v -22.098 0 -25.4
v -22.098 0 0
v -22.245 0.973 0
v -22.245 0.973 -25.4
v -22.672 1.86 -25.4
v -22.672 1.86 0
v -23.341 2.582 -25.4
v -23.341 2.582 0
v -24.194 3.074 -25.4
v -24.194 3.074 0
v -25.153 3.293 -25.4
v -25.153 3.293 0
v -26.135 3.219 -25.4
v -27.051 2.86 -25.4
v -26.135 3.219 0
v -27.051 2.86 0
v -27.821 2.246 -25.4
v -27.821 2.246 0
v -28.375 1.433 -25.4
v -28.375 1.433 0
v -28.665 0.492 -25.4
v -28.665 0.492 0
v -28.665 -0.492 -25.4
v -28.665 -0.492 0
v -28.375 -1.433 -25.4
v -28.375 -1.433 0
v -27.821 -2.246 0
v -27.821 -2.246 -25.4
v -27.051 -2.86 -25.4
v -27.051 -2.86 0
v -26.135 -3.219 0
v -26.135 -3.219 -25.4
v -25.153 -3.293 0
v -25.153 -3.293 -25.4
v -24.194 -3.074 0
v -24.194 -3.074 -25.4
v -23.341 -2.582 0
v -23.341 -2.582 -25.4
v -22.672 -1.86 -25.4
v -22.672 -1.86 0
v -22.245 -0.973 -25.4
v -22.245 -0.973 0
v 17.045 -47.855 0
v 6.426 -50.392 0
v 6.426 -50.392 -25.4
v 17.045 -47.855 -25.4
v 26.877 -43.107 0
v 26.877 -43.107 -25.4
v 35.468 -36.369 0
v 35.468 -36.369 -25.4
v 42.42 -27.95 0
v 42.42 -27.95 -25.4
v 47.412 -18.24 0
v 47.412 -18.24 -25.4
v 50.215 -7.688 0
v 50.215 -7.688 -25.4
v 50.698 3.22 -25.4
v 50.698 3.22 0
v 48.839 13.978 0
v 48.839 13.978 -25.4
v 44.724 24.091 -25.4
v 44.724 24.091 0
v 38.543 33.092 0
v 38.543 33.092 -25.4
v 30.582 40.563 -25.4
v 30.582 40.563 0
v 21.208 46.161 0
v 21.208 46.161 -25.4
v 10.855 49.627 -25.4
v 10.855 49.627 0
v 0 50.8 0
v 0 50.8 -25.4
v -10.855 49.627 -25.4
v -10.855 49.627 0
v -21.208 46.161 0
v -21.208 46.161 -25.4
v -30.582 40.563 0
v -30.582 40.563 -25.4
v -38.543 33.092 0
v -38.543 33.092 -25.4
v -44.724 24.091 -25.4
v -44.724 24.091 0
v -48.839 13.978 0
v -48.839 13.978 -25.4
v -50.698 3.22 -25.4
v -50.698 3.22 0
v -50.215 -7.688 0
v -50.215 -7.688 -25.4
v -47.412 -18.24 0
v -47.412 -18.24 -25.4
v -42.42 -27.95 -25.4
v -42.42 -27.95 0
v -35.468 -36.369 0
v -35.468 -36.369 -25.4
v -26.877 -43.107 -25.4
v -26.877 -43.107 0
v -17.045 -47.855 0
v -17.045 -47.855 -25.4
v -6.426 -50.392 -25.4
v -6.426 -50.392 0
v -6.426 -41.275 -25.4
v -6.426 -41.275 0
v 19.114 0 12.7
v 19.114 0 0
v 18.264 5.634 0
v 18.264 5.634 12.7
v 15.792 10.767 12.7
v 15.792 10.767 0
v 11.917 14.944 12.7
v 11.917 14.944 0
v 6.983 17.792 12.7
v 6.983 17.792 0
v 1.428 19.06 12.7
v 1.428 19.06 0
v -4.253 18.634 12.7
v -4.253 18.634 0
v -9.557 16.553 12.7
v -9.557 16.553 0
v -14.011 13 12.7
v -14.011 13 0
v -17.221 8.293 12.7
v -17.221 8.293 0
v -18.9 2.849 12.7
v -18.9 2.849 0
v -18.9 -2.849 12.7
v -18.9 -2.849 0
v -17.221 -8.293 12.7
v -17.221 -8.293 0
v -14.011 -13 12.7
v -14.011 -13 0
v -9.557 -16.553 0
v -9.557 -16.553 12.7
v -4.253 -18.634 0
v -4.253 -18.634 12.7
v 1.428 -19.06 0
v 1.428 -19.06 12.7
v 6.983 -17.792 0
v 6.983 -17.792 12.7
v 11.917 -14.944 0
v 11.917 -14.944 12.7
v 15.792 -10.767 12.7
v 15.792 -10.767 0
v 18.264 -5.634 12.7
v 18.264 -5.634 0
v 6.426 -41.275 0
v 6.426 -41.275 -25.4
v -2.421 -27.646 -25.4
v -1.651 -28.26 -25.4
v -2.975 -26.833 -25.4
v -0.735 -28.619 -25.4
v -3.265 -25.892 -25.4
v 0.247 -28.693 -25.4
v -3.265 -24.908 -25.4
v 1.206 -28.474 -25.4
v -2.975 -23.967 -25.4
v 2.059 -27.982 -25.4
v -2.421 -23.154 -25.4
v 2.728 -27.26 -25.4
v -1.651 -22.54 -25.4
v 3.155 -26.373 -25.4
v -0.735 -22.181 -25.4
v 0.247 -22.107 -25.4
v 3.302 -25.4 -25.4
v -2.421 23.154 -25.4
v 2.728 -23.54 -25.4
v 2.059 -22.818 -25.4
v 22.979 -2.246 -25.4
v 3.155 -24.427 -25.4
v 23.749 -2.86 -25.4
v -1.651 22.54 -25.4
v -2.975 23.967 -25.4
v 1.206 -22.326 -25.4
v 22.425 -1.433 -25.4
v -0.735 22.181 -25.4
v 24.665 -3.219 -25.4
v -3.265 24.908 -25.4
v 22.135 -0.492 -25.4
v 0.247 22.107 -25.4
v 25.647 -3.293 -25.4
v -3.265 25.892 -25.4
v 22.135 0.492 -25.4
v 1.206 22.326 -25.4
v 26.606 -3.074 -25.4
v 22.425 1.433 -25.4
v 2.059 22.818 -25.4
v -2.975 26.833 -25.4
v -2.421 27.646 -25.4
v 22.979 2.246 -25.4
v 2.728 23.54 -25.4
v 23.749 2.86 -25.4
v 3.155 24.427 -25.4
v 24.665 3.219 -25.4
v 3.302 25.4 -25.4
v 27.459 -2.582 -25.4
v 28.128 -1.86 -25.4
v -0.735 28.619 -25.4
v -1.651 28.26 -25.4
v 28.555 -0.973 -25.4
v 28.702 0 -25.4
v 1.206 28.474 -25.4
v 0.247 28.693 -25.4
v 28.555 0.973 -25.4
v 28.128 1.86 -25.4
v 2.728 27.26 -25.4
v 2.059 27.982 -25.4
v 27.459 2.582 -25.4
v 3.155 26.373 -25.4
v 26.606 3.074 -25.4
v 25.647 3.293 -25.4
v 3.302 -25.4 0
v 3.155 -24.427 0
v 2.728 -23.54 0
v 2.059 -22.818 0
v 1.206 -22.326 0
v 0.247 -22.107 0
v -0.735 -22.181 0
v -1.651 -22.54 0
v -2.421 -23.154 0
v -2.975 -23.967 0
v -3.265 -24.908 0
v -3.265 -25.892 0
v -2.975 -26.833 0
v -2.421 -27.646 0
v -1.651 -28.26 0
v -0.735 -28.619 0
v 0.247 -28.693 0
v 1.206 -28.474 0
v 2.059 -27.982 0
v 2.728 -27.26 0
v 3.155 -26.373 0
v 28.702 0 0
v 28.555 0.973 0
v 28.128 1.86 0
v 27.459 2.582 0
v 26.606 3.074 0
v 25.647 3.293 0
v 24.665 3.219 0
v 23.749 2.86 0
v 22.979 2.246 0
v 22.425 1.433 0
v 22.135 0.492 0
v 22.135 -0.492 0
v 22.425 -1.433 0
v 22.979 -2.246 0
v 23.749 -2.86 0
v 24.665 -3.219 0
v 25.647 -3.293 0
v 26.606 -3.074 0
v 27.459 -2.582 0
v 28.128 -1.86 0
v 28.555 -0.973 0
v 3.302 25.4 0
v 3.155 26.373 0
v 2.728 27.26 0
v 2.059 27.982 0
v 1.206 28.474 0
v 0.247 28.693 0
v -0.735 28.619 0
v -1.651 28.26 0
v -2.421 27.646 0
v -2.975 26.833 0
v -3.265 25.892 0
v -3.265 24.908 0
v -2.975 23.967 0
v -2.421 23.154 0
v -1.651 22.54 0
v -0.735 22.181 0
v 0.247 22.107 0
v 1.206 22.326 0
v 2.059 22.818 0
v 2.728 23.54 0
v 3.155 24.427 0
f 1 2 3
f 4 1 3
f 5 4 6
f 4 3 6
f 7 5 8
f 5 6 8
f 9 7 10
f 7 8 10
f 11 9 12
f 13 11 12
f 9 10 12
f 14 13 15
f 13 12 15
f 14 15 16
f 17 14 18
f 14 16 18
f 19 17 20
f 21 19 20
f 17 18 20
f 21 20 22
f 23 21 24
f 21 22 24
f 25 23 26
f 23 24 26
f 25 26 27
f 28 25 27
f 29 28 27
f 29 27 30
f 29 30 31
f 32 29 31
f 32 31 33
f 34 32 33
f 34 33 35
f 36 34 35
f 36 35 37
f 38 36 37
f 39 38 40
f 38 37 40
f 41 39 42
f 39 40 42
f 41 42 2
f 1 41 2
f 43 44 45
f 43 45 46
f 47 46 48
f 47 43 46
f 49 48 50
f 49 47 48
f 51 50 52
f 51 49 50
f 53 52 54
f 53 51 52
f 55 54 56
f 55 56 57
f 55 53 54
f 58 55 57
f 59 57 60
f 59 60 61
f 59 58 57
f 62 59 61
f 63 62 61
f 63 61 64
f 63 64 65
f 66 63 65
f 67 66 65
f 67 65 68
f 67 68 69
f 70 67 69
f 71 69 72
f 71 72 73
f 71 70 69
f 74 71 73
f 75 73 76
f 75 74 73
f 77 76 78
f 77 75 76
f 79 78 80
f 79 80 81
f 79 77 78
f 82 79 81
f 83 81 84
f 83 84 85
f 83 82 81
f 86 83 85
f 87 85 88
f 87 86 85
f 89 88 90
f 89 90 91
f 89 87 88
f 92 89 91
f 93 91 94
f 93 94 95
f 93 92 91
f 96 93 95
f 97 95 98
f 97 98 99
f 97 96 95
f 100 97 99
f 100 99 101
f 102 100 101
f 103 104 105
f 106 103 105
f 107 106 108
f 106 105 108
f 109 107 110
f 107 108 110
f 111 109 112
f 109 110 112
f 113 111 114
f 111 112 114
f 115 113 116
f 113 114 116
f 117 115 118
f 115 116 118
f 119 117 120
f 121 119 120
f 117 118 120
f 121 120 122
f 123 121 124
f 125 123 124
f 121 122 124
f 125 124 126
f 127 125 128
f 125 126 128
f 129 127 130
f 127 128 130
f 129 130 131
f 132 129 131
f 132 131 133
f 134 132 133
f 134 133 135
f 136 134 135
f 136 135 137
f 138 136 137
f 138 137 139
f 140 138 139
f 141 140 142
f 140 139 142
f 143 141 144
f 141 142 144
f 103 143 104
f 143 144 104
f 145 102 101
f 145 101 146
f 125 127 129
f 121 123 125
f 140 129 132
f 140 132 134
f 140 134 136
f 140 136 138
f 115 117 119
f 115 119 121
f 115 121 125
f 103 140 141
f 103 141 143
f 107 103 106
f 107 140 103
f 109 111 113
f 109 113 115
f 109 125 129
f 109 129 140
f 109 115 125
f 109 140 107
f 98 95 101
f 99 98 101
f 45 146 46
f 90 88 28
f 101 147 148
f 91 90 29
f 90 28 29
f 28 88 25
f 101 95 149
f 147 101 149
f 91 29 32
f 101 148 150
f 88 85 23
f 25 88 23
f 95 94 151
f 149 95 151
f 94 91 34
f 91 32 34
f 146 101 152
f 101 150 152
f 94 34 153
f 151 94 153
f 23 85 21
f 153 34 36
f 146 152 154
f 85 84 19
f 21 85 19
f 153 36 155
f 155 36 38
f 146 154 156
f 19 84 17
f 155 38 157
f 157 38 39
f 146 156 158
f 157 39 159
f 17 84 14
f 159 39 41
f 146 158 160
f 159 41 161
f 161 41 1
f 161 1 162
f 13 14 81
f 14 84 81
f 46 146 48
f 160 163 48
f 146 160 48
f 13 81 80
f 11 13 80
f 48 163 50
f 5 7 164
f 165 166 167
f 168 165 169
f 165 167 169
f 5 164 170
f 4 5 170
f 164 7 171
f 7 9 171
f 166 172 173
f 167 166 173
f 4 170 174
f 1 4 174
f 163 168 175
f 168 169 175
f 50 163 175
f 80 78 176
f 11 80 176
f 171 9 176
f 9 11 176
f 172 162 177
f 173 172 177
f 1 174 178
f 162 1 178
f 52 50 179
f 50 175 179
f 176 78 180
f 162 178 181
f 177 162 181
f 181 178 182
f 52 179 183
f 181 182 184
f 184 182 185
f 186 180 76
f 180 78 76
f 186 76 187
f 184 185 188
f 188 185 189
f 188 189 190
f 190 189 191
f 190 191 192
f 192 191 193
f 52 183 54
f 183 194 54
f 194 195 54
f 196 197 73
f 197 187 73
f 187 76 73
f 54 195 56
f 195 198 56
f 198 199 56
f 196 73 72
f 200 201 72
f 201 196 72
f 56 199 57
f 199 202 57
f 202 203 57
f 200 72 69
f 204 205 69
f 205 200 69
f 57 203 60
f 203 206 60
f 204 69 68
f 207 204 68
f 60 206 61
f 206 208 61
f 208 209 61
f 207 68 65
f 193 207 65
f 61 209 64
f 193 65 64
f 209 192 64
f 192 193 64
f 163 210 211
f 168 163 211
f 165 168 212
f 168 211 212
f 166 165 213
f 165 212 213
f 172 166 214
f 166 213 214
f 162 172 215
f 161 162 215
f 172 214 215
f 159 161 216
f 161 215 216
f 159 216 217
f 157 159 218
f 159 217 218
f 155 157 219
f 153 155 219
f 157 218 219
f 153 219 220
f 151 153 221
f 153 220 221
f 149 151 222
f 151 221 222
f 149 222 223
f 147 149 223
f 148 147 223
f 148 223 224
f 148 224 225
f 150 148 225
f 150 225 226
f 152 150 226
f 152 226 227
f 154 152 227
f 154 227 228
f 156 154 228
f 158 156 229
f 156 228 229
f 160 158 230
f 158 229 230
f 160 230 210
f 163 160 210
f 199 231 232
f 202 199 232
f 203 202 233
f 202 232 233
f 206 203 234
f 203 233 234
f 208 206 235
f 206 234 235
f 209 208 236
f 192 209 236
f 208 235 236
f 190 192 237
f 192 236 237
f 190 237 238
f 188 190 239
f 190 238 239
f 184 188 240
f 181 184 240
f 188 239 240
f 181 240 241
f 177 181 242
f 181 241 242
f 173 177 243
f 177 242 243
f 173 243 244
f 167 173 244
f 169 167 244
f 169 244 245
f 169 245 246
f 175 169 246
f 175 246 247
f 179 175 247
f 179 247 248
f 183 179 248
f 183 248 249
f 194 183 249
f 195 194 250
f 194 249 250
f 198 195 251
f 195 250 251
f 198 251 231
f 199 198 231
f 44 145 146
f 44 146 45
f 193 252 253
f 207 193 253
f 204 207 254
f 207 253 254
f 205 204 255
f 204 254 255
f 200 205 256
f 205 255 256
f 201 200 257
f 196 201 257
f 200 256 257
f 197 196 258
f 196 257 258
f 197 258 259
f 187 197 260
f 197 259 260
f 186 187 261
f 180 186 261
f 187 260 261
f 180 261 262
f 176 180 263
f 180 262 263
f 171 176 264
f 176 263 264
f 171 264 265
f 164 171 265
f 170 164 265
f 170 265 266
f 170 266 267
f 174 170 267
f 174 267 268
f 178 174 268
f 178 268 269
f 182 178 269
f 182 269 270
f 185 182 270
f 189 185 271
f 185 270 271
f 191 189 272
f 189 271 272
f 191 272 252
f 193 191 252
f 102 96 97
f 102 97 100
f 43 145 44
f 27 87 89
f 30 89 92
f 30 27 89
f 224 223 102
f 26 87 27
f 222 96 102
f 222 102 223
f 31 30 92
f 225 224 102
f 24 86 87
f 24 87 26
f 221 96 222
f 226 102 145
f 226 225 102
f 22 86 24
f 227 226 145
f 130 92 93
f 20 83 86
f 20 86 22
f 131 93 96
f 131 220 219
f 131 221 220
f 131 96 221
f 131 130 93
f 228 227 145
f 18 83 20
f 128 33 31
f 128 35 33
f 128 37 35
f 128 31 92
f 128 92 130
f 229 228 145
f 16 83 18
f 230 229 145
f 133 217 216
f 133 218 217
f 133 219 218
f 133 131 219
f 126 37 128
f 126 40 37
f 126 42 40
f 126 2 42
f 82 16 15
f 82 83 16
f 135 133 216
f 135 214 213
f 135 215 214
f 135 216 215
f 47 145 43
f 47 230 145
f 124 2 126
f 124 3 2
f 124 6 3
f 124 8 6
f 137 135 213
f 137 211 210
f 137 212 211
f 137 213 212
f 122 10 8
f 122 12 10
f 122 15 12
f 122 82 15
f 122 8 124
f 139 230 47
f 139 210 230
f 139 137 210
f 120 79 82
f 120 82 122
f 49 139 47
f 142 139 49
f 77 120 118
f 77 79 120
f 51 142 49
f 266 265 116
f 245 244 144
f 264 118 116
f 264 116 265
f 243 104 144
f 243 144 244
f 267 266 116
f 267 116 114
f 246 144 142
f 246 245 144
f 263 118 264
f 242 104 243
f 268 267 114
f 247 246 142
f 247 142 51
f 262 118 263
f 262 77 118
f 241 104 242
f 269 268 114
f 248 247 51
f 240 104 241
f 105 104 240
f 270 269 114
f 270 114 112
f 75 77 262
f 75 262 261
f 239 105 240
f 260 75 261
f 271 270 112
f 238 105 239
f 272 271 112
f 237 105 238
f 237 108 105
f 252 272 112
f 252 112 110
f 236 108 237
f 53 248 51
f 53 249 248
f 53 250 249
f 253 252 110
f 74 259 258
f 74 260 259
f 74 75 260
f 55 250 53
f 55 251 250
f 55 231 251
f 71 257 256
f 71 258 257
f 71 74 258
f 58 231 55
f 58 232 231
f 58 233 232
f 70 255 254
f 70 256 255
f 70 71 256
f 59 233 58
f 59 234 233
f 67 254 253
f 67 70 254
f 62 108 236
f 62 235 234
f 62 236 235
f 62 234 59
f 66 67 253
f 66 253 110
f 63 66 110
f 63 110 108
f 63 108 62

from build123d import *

# Parameters (mm, degrees)
SKETCH1_R           = 3.302
BOSS_EXTRUDE1_DEPTH = 25.4
SKETCH1_4_R         = 19.1135
BOSS_EXTRUDE2_DEPTH = 12.7


with BuildPart() as part:
    # Sketch1 → Boss-Extrude1 (new body)
    with BuildSketch(Plane.XY):
        with BuildLine():
            Line((-6.4262, -50.391903651), (-6.4262, -41.275))
            Line((-6.4262, -41.275), (6.4262, -41.275))
            Line((6.4262, -41.275), (6.4262, -50.391903651))
            ThreePointArc((6.4262, -50.391903651), (0, 50.8), (-6.4262, -50.391903651))
        make_face()
        with Locations((-25.4, 0)):
            Circle(SKETCH1_R, mode=Mode.SUBTRACT)
        with Locations((0, -25.4)):
            Circle(SKETCH1_R, mode=Mode.SUBTRACT)
        with Locations((25.4, 0)):
            Circle(SKETCH1_R, mode=Mode.SUBTRACT)
        with Locations((0, 25.4)):
            Circle(SKETCH1_R, mode=Mode.SUBTRACT)
    extrude(amount=-BOSS_EXTRUDE1_DEPTH)

    # Sketch1<4> → Boss-Extrude2 (add)
    with BuildSketch(Plane.XY):
        Circle(SKETCH1_4_R)
    extrude(amount=BOSS_EXTRUDE2_DEPTH)


solid = part.part
